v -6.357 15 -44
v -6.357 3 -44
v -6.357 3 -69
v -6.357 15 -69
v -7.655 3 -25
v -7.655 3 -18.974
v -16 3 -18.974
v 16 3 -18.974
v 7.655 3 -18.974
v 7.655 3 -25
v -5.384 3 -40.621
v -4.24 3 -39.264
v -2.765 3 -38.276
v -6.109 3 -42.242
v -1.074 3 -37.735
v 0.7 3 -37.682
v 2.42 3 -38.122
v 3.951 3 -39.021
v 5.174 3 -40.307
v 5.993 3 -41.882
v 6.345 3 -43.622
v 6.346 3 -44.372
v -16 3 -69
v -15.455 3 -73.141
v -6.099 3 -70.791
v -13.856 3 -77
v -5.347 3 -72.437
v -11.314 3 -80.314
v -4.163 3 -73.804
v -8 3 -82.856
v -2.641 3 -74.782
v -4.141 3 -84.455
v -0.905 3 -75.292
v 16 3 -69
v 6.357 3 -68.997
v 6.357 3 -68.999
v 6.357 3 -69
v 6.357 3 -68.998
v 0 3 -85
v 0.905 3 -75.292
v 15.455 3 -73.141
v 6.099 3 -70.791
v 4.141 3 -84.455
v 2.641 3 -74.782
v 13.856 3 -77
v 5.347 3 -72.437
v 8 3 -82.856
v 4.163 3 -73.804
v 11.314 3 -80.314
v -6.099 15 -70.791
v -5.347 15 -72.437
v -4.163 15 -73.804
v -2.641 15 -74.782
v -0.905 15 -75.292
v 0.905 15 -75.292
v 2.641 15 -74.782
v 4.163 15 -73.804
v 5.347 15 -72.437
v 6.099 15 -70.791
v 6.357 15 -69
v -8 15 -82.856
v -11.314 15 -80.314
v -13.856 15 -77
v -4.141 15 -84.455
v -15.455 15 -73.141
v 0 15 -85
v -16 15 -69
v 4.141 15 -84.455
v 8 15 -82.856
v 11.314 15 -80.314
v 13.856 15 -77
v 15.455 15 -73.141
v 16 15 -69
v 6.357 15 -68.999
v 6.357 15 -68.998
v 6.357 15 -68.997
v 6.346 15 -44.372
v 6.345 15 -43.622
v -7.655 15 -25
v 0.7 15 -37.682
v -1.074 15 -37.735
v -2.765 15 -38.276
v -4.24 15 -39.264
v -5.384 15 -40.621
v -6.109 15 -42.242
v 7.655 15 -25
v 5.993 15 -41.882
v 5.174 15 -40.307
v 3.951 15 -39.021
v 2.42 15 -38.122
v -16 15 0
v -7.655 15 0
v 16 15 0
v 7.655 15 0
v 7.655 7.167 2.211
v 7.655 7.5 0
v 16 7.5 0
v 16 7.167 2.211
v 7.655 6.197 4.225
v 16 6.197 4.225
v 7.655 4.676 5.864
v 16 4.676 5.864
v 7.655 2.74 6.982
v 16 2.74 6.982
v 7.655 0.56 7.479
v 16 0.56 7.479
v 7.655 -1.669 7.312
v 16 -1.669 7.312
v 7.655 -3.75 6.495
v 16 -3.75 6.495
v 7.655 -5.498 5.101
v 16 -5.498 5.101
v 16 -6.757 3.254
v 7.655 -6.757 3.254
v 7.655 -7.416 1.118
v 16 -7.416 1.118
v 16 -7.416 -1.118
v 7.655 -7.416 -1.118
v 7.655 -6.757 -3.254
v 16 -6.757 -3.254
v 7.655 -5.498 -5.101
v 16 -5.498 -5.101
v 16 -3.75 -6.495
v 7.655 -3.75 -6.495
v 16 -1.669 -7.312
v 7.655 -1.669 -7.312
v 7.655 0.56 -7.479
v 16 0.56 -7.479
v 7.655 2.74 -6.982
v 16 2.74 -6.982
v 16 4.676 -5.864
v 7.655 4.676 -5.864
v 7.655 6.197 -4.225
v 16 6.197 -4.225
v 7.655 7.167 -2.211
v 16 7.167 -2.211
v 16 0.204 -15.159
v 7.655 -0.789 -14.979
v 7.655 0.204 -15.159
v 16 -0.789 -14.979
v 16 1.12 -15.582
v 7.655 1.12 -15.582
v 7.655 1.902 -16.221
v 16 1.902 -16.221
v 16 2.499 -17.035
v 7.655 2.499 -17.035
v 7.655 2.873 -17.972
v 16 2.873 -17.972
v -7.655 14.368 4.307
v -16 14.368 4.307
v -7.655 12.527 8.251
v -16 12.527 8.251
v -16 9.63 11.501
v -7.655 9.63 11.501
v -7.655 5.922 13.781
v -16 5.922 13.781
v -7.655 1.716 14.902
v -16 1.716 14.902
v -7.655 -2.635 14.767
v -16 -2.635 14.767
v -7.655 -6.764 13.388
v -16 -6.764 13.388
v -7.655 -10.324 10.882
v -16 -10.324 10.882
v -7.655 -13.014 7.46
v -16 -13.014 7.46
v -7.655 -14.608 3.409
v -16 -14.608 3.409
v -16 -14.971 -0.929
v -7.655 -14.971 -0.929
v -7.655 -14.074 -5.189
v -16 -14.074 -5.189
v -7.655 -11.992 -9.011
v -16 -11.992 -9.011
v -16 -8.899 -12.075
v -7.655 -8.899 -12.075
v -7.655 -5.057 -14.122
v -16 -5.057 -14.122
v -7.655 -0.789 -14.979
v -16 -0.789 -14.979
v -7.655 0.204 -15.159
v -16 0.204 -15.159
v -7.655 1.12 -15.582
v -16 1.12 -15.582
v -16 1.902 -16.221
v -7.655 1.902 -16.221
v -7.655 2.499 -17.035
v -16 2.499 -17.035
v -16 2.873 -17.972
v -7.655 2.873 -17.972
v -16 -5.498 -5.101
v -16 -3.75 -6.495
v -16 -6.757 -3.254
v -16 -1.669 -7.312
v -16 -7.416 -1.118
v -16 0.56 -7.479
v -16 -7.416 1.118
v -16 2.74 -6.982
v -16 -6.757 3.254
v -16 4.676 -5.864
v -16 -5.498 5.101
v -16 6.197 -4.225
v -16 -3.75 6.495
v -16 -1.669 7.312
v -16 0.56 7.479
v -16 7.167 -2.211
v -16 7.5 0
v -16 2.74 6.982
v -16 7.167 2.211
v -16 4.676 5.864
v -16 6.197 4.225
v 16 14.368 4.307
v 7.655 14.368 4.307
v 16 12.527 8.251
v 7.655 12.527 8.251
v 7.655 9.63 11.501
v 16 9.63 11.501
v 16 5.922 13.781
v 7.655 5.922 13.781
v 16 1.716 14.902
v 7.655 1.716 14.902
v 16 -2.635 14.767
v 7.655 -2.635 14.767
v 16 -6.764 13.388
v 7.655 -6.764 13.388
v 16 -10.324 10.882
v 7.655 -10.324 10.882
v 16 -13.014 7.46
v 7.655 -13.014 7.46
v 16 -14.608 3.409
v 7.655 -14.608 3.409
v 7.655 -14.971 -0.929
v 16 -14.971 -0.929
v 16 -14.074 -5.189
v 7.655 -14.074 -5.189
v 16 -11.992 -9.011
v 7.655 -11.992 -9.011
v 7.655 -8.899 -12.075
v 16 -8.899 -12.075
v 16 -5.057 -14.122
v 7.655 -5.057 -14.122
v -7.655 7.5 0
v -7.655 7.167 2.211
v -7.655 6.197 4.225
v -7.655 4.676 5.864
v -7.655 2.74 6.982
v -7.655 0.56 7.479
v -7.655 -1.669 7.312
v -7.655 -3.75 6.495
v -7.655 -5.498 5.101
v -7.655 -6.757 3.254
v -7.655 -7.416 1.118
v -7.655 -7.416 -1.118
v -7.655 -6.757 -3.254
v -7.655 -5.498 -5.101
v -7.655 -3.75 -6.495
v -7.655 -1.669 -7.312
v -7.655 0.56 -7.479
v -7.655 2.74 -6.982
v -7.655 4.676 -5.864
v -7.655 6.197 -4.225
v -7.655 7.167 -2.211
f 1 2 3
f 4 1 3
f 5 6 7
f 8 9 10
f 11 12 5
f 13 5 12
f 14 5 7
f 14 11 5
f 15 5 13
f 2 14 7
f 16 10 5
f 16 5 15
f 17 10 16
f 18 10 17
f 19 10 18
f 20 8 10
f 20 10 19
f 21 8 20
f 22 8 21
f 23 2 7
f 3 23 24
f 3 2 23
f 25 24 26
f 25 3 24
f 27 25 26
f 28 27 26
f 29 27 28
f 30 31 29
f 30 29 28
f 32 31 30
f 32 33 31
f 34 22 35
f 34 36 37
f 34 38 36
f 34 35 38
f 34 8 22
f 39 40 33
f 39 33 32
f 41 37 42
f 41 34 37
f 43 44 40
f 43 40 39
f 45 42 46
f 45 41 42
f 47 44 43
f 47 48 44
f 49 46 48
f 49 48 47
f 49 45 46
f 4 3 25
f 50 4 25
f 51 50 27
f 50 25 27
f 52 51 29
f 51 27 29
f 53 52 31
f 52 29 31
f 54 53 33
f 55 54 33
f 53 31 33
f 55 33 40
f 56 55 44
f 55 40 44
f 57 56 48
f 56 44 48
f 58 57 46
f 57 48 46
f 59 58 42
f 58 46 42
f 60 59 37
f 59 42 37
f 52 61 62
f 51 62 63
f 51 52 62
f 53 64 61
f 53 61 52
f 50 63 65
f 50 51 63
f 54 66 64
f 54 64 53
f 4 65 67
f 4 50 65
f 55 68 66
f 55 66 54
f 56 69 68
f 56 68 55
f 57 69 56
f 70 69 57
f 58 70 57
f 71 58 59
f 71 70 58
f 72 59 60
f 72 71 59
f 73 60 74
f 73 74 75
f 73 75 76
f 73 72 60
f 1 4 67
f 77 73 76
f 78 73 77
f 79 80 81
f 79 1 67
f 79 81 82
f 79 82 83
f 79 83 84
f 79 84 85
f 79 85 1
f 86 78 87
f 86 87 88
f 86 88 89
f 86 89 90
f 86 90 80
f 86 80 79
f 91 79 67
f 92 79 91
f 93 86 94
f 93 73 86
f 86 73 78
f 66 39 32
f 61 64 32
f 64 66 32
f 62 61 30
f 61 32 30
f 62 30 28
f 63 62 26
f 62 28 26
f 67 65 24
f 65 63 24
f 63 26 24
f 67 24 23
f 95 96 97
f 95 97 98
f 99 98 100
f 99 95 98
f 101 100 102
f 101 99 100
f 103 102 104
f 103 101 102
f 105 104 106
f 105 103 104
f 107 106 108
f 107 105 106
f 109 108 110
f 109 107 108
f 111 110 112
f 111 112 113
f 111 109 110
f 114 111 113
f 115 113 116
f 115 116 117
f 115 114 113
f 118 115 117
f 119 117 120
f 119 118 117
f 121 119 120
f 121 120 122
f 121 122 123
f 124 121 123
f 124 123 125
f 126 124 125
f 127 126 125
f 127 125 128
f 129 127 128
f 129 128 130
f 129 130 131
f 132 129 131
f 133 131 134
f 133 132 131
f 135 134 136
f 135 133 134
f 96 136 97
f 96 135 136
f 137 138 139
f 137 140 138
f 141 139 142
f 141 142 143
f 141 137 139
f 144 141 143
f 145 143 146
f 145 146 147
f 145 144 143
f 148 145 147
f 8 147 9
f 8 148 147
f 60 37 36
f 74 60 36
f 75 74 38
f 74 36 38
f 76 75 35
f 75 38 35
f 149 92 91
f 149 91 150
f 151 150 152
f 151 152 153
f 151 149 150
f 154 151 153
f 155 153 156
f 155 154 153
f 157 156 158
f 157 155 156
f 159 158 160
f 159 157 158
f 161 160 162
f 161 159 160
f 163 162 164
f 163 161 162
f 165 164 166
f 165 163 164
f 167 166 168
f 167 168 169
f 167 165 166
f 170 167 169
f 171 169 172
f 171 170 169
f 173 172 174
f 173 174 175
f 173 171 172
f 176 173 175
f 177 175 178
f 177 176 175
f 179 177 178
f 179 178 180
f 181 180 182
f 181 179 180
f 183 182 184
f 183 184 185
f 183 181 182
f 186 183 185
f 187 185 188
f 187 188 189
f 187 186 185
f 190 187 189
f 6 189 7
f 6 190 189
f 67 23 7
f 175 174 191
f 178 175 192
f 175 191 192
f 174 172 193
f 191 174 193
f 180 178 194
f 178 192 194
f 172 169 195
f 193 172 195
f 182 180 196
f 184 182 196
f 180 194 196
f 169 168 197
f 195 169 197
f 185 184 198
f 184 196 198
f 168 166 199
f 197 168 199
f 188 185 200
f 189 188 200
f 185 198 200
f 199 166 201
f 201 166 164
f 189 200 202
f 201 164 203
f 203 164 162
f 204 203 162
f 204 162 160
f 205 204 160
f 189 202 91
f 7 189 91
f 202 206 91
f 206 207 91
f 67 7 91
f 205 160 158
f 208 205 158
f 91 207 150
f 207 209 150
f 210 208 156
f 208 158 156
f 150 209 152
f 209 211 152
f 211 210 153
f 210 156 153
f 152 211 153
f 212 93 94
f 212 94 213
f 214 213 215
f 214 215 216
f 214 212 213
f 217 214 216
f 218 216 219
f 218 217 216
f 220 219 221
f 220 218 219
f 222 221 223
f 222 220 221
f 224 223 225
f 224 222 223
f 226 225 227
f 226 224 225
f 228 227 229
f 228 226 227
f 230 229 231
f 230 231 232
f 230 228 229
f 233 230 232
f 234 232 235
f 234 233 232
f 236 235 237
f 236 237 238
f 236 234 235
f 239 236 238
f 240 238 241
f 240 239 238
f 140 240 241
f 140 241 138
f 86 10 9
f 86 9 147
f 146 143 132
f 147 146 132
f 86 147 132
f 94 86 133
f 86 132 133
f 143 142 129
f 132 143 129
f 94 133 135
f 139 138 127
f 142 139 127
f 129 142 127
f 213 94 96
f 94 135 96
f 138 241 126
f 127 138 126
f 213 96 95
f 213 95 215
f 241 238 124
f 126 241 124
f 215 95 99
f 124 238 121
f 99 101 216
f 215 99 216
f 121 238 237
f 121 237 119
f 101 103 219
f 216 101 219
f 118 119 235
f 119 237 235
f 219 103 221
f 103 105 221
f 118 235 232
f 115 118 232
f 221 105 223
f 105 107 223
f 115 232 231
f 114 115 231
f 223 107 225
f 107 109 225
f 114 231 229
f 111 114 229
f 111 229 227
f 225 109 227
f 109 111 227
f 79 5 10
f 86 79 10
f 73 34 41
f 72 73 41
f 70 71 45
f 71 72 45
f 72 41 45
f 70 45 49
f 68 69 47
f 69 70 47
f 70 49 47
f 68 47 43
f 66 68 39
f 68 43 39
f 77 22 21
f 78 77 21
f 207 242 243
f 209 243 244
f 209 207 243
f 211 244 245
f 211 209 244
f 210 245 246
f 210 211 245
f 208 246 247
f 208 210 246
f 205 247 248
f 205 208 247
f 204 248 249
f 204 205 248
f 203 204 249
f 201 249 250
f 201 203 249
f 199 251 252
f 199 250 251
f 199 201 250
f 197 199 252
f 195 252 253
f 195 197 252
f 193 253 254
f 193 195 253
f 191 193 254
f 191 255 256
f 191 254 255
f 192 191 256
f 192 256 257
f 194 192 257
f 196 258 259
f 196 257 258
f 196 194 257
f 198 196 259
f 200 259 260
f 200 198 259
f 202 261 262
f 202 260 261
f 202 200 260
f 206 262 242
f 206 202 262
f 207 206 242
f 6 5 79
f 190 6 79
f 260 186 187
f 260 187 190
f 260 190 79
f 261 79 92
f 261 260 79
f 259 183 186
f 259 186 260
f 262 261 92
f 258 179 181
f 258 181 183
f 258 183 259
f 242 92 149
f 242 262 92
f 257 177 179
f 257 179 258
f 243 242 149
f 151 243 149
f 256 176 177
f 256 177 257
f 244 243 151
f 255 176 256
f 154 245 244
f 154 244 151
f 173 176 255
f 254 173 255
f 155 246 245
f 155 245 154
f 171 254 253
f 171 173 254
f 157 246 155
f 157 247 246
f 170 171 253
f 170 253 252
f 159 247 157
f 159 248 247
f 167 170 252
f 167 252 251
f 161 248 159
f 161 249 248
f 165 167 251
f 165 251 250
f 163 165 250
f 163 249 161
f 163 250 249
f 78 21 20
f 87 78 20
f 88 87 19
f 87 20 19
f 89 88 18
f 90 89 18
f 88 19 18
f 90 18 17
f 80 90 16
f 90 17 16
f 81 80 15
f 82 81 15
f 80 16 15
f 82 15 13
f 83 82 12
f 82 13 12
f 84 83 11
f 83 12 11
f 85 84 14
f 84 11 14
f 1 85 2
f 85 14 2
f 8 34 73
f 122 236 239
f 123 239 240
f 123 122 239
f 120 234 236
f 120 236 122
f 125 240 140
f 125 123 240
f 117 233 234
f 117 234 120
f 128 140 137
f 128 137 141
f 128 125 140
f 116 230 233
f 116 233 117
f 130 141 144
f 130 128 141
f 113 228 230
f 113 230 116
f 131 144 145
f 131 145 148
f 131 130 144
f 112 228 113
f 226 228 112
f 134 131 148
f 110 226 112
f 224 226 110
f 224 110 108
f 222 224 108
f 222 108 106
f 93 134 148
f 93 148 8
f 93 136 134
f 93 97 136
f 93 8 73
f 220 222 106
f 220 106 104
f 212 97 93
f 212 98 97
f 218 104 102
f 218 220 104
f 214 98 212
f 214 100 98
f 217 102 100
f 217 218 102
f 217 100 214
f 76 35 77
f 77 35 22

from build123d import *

# Parameters (mm, degrees)
F0_R     = 7.5
F1_DEPTH = 16
F3_W     = 15.3093371987
F3_H     = 50
F4_DEPTH = 55.501
F5_R     = 4
F6_DEPTH = 55.501


# Not quite as in the source:
# - a feature names something its author has since deleted; it is built from what else it names


with BuildPart() as f1:
    # F0 (on Right) → F1 (new body, symmetric)
    with BuildSketch(Plane.YZ):
        with BuildLine():
            Line((15, -85), (15, 0))
            ThreePointArc((15, 0), (-11.6189500386, 9.4868329805), (3, -14.6969384567))
            Line((3, -14.6969384567), (3, -85))
            Line((3, -85), (15, -85))
        make_face()
        Circle(F0_R, mode=Mode.SUBTRACT)
    extrude(amount=F1_DEPTH, both=True)

    # F3 (on offset) → F4 (cut, through all)
    with BuildSketch(Plane.XZ.offset(40.5)):
        with BuildLine():
            Line((6.3565325715, -68.9971852547), (6.3456283358, -44.3721764072))
            Line((6.3456283358, -44.3721764072), (6.3452962394, -43.6222039062))
            ThreePointArc((6.3452962394, -43.6222039062), (-0.1889815849, -37.6462766652), (-6.3565331947, -44))
            Line((-6.3565331947, -44), (-6.3565331947, -69))
            ThreePointArc((-6.3565331947, -69), (0, -75.3565331947), (6.3565331947, -69))
            ThreePointArc((6.3565331947, -69), (6.3565330389, -68.9985926273), (6.3565325715, -68.9971852547))
        make_face()
        Rectangle(F3_W, F3_H)
    extrude(amount=-F4_DEPTH, mode=Mode.SUBTRACT)

    # F5
    f5_edges = [f1.edges().sort_by_distance(p)[0] for p in [
        (-11.827334, 3, -14.696938),
        (11.827334, 3, -14.696938),
    ]]
    fillet(f5_edges, radius=F5_R)

    # F3 (on offset) → F6 (cut, through all)
    with BuildSketch(Plane.XZ.offset(40.5)):
        with BuildLine():
            ThreePointArc((2.313e-07, -85), (-11.3137084172, -80.3137085808), (-16, -69))
            Line((-16, -69), (-16, -85))
            Line((-16, -85), (2.313e-07, -85))
        make_face()
        with BuildLine():
            ThreePointArc((16, -69), (11.3137085808, -80.3137084172), (2.313e-07, -85))
            Line((2.313e-07, -85), (16, -85))
            Line((16, -85), (16, -69))
        make_face()
        with BuildLine():
            Line((6.3565325715, -68.9971852547), (6.3456283358, -44.3721764072))
            Line((6.3456283358, -44.3721764072), (6.3452962394, -43.6222039062))
            ThreePointArc((6.3452962394, -43.6222039062), (-0.1889815849, -37.6462766652), (-6.3565331947, -44))
            Line((-6.3565331947, -44), (-6.3565331947, -69))
            ThreePointArc((-6.3565331947, -69), (0, -75.3565331947), (6.3565331947, -69))
            ThreePointArc((6.3565331947, -69), (6.3565330389, -68.9985926273), (6.3565325715, -68.9971852547))
        make_face()
        Rectangle(F3_W, F3_H)
    extrude(amount=-F6_DEPTH, mode=Mode.SUBTRACT)


solid = f1.part
